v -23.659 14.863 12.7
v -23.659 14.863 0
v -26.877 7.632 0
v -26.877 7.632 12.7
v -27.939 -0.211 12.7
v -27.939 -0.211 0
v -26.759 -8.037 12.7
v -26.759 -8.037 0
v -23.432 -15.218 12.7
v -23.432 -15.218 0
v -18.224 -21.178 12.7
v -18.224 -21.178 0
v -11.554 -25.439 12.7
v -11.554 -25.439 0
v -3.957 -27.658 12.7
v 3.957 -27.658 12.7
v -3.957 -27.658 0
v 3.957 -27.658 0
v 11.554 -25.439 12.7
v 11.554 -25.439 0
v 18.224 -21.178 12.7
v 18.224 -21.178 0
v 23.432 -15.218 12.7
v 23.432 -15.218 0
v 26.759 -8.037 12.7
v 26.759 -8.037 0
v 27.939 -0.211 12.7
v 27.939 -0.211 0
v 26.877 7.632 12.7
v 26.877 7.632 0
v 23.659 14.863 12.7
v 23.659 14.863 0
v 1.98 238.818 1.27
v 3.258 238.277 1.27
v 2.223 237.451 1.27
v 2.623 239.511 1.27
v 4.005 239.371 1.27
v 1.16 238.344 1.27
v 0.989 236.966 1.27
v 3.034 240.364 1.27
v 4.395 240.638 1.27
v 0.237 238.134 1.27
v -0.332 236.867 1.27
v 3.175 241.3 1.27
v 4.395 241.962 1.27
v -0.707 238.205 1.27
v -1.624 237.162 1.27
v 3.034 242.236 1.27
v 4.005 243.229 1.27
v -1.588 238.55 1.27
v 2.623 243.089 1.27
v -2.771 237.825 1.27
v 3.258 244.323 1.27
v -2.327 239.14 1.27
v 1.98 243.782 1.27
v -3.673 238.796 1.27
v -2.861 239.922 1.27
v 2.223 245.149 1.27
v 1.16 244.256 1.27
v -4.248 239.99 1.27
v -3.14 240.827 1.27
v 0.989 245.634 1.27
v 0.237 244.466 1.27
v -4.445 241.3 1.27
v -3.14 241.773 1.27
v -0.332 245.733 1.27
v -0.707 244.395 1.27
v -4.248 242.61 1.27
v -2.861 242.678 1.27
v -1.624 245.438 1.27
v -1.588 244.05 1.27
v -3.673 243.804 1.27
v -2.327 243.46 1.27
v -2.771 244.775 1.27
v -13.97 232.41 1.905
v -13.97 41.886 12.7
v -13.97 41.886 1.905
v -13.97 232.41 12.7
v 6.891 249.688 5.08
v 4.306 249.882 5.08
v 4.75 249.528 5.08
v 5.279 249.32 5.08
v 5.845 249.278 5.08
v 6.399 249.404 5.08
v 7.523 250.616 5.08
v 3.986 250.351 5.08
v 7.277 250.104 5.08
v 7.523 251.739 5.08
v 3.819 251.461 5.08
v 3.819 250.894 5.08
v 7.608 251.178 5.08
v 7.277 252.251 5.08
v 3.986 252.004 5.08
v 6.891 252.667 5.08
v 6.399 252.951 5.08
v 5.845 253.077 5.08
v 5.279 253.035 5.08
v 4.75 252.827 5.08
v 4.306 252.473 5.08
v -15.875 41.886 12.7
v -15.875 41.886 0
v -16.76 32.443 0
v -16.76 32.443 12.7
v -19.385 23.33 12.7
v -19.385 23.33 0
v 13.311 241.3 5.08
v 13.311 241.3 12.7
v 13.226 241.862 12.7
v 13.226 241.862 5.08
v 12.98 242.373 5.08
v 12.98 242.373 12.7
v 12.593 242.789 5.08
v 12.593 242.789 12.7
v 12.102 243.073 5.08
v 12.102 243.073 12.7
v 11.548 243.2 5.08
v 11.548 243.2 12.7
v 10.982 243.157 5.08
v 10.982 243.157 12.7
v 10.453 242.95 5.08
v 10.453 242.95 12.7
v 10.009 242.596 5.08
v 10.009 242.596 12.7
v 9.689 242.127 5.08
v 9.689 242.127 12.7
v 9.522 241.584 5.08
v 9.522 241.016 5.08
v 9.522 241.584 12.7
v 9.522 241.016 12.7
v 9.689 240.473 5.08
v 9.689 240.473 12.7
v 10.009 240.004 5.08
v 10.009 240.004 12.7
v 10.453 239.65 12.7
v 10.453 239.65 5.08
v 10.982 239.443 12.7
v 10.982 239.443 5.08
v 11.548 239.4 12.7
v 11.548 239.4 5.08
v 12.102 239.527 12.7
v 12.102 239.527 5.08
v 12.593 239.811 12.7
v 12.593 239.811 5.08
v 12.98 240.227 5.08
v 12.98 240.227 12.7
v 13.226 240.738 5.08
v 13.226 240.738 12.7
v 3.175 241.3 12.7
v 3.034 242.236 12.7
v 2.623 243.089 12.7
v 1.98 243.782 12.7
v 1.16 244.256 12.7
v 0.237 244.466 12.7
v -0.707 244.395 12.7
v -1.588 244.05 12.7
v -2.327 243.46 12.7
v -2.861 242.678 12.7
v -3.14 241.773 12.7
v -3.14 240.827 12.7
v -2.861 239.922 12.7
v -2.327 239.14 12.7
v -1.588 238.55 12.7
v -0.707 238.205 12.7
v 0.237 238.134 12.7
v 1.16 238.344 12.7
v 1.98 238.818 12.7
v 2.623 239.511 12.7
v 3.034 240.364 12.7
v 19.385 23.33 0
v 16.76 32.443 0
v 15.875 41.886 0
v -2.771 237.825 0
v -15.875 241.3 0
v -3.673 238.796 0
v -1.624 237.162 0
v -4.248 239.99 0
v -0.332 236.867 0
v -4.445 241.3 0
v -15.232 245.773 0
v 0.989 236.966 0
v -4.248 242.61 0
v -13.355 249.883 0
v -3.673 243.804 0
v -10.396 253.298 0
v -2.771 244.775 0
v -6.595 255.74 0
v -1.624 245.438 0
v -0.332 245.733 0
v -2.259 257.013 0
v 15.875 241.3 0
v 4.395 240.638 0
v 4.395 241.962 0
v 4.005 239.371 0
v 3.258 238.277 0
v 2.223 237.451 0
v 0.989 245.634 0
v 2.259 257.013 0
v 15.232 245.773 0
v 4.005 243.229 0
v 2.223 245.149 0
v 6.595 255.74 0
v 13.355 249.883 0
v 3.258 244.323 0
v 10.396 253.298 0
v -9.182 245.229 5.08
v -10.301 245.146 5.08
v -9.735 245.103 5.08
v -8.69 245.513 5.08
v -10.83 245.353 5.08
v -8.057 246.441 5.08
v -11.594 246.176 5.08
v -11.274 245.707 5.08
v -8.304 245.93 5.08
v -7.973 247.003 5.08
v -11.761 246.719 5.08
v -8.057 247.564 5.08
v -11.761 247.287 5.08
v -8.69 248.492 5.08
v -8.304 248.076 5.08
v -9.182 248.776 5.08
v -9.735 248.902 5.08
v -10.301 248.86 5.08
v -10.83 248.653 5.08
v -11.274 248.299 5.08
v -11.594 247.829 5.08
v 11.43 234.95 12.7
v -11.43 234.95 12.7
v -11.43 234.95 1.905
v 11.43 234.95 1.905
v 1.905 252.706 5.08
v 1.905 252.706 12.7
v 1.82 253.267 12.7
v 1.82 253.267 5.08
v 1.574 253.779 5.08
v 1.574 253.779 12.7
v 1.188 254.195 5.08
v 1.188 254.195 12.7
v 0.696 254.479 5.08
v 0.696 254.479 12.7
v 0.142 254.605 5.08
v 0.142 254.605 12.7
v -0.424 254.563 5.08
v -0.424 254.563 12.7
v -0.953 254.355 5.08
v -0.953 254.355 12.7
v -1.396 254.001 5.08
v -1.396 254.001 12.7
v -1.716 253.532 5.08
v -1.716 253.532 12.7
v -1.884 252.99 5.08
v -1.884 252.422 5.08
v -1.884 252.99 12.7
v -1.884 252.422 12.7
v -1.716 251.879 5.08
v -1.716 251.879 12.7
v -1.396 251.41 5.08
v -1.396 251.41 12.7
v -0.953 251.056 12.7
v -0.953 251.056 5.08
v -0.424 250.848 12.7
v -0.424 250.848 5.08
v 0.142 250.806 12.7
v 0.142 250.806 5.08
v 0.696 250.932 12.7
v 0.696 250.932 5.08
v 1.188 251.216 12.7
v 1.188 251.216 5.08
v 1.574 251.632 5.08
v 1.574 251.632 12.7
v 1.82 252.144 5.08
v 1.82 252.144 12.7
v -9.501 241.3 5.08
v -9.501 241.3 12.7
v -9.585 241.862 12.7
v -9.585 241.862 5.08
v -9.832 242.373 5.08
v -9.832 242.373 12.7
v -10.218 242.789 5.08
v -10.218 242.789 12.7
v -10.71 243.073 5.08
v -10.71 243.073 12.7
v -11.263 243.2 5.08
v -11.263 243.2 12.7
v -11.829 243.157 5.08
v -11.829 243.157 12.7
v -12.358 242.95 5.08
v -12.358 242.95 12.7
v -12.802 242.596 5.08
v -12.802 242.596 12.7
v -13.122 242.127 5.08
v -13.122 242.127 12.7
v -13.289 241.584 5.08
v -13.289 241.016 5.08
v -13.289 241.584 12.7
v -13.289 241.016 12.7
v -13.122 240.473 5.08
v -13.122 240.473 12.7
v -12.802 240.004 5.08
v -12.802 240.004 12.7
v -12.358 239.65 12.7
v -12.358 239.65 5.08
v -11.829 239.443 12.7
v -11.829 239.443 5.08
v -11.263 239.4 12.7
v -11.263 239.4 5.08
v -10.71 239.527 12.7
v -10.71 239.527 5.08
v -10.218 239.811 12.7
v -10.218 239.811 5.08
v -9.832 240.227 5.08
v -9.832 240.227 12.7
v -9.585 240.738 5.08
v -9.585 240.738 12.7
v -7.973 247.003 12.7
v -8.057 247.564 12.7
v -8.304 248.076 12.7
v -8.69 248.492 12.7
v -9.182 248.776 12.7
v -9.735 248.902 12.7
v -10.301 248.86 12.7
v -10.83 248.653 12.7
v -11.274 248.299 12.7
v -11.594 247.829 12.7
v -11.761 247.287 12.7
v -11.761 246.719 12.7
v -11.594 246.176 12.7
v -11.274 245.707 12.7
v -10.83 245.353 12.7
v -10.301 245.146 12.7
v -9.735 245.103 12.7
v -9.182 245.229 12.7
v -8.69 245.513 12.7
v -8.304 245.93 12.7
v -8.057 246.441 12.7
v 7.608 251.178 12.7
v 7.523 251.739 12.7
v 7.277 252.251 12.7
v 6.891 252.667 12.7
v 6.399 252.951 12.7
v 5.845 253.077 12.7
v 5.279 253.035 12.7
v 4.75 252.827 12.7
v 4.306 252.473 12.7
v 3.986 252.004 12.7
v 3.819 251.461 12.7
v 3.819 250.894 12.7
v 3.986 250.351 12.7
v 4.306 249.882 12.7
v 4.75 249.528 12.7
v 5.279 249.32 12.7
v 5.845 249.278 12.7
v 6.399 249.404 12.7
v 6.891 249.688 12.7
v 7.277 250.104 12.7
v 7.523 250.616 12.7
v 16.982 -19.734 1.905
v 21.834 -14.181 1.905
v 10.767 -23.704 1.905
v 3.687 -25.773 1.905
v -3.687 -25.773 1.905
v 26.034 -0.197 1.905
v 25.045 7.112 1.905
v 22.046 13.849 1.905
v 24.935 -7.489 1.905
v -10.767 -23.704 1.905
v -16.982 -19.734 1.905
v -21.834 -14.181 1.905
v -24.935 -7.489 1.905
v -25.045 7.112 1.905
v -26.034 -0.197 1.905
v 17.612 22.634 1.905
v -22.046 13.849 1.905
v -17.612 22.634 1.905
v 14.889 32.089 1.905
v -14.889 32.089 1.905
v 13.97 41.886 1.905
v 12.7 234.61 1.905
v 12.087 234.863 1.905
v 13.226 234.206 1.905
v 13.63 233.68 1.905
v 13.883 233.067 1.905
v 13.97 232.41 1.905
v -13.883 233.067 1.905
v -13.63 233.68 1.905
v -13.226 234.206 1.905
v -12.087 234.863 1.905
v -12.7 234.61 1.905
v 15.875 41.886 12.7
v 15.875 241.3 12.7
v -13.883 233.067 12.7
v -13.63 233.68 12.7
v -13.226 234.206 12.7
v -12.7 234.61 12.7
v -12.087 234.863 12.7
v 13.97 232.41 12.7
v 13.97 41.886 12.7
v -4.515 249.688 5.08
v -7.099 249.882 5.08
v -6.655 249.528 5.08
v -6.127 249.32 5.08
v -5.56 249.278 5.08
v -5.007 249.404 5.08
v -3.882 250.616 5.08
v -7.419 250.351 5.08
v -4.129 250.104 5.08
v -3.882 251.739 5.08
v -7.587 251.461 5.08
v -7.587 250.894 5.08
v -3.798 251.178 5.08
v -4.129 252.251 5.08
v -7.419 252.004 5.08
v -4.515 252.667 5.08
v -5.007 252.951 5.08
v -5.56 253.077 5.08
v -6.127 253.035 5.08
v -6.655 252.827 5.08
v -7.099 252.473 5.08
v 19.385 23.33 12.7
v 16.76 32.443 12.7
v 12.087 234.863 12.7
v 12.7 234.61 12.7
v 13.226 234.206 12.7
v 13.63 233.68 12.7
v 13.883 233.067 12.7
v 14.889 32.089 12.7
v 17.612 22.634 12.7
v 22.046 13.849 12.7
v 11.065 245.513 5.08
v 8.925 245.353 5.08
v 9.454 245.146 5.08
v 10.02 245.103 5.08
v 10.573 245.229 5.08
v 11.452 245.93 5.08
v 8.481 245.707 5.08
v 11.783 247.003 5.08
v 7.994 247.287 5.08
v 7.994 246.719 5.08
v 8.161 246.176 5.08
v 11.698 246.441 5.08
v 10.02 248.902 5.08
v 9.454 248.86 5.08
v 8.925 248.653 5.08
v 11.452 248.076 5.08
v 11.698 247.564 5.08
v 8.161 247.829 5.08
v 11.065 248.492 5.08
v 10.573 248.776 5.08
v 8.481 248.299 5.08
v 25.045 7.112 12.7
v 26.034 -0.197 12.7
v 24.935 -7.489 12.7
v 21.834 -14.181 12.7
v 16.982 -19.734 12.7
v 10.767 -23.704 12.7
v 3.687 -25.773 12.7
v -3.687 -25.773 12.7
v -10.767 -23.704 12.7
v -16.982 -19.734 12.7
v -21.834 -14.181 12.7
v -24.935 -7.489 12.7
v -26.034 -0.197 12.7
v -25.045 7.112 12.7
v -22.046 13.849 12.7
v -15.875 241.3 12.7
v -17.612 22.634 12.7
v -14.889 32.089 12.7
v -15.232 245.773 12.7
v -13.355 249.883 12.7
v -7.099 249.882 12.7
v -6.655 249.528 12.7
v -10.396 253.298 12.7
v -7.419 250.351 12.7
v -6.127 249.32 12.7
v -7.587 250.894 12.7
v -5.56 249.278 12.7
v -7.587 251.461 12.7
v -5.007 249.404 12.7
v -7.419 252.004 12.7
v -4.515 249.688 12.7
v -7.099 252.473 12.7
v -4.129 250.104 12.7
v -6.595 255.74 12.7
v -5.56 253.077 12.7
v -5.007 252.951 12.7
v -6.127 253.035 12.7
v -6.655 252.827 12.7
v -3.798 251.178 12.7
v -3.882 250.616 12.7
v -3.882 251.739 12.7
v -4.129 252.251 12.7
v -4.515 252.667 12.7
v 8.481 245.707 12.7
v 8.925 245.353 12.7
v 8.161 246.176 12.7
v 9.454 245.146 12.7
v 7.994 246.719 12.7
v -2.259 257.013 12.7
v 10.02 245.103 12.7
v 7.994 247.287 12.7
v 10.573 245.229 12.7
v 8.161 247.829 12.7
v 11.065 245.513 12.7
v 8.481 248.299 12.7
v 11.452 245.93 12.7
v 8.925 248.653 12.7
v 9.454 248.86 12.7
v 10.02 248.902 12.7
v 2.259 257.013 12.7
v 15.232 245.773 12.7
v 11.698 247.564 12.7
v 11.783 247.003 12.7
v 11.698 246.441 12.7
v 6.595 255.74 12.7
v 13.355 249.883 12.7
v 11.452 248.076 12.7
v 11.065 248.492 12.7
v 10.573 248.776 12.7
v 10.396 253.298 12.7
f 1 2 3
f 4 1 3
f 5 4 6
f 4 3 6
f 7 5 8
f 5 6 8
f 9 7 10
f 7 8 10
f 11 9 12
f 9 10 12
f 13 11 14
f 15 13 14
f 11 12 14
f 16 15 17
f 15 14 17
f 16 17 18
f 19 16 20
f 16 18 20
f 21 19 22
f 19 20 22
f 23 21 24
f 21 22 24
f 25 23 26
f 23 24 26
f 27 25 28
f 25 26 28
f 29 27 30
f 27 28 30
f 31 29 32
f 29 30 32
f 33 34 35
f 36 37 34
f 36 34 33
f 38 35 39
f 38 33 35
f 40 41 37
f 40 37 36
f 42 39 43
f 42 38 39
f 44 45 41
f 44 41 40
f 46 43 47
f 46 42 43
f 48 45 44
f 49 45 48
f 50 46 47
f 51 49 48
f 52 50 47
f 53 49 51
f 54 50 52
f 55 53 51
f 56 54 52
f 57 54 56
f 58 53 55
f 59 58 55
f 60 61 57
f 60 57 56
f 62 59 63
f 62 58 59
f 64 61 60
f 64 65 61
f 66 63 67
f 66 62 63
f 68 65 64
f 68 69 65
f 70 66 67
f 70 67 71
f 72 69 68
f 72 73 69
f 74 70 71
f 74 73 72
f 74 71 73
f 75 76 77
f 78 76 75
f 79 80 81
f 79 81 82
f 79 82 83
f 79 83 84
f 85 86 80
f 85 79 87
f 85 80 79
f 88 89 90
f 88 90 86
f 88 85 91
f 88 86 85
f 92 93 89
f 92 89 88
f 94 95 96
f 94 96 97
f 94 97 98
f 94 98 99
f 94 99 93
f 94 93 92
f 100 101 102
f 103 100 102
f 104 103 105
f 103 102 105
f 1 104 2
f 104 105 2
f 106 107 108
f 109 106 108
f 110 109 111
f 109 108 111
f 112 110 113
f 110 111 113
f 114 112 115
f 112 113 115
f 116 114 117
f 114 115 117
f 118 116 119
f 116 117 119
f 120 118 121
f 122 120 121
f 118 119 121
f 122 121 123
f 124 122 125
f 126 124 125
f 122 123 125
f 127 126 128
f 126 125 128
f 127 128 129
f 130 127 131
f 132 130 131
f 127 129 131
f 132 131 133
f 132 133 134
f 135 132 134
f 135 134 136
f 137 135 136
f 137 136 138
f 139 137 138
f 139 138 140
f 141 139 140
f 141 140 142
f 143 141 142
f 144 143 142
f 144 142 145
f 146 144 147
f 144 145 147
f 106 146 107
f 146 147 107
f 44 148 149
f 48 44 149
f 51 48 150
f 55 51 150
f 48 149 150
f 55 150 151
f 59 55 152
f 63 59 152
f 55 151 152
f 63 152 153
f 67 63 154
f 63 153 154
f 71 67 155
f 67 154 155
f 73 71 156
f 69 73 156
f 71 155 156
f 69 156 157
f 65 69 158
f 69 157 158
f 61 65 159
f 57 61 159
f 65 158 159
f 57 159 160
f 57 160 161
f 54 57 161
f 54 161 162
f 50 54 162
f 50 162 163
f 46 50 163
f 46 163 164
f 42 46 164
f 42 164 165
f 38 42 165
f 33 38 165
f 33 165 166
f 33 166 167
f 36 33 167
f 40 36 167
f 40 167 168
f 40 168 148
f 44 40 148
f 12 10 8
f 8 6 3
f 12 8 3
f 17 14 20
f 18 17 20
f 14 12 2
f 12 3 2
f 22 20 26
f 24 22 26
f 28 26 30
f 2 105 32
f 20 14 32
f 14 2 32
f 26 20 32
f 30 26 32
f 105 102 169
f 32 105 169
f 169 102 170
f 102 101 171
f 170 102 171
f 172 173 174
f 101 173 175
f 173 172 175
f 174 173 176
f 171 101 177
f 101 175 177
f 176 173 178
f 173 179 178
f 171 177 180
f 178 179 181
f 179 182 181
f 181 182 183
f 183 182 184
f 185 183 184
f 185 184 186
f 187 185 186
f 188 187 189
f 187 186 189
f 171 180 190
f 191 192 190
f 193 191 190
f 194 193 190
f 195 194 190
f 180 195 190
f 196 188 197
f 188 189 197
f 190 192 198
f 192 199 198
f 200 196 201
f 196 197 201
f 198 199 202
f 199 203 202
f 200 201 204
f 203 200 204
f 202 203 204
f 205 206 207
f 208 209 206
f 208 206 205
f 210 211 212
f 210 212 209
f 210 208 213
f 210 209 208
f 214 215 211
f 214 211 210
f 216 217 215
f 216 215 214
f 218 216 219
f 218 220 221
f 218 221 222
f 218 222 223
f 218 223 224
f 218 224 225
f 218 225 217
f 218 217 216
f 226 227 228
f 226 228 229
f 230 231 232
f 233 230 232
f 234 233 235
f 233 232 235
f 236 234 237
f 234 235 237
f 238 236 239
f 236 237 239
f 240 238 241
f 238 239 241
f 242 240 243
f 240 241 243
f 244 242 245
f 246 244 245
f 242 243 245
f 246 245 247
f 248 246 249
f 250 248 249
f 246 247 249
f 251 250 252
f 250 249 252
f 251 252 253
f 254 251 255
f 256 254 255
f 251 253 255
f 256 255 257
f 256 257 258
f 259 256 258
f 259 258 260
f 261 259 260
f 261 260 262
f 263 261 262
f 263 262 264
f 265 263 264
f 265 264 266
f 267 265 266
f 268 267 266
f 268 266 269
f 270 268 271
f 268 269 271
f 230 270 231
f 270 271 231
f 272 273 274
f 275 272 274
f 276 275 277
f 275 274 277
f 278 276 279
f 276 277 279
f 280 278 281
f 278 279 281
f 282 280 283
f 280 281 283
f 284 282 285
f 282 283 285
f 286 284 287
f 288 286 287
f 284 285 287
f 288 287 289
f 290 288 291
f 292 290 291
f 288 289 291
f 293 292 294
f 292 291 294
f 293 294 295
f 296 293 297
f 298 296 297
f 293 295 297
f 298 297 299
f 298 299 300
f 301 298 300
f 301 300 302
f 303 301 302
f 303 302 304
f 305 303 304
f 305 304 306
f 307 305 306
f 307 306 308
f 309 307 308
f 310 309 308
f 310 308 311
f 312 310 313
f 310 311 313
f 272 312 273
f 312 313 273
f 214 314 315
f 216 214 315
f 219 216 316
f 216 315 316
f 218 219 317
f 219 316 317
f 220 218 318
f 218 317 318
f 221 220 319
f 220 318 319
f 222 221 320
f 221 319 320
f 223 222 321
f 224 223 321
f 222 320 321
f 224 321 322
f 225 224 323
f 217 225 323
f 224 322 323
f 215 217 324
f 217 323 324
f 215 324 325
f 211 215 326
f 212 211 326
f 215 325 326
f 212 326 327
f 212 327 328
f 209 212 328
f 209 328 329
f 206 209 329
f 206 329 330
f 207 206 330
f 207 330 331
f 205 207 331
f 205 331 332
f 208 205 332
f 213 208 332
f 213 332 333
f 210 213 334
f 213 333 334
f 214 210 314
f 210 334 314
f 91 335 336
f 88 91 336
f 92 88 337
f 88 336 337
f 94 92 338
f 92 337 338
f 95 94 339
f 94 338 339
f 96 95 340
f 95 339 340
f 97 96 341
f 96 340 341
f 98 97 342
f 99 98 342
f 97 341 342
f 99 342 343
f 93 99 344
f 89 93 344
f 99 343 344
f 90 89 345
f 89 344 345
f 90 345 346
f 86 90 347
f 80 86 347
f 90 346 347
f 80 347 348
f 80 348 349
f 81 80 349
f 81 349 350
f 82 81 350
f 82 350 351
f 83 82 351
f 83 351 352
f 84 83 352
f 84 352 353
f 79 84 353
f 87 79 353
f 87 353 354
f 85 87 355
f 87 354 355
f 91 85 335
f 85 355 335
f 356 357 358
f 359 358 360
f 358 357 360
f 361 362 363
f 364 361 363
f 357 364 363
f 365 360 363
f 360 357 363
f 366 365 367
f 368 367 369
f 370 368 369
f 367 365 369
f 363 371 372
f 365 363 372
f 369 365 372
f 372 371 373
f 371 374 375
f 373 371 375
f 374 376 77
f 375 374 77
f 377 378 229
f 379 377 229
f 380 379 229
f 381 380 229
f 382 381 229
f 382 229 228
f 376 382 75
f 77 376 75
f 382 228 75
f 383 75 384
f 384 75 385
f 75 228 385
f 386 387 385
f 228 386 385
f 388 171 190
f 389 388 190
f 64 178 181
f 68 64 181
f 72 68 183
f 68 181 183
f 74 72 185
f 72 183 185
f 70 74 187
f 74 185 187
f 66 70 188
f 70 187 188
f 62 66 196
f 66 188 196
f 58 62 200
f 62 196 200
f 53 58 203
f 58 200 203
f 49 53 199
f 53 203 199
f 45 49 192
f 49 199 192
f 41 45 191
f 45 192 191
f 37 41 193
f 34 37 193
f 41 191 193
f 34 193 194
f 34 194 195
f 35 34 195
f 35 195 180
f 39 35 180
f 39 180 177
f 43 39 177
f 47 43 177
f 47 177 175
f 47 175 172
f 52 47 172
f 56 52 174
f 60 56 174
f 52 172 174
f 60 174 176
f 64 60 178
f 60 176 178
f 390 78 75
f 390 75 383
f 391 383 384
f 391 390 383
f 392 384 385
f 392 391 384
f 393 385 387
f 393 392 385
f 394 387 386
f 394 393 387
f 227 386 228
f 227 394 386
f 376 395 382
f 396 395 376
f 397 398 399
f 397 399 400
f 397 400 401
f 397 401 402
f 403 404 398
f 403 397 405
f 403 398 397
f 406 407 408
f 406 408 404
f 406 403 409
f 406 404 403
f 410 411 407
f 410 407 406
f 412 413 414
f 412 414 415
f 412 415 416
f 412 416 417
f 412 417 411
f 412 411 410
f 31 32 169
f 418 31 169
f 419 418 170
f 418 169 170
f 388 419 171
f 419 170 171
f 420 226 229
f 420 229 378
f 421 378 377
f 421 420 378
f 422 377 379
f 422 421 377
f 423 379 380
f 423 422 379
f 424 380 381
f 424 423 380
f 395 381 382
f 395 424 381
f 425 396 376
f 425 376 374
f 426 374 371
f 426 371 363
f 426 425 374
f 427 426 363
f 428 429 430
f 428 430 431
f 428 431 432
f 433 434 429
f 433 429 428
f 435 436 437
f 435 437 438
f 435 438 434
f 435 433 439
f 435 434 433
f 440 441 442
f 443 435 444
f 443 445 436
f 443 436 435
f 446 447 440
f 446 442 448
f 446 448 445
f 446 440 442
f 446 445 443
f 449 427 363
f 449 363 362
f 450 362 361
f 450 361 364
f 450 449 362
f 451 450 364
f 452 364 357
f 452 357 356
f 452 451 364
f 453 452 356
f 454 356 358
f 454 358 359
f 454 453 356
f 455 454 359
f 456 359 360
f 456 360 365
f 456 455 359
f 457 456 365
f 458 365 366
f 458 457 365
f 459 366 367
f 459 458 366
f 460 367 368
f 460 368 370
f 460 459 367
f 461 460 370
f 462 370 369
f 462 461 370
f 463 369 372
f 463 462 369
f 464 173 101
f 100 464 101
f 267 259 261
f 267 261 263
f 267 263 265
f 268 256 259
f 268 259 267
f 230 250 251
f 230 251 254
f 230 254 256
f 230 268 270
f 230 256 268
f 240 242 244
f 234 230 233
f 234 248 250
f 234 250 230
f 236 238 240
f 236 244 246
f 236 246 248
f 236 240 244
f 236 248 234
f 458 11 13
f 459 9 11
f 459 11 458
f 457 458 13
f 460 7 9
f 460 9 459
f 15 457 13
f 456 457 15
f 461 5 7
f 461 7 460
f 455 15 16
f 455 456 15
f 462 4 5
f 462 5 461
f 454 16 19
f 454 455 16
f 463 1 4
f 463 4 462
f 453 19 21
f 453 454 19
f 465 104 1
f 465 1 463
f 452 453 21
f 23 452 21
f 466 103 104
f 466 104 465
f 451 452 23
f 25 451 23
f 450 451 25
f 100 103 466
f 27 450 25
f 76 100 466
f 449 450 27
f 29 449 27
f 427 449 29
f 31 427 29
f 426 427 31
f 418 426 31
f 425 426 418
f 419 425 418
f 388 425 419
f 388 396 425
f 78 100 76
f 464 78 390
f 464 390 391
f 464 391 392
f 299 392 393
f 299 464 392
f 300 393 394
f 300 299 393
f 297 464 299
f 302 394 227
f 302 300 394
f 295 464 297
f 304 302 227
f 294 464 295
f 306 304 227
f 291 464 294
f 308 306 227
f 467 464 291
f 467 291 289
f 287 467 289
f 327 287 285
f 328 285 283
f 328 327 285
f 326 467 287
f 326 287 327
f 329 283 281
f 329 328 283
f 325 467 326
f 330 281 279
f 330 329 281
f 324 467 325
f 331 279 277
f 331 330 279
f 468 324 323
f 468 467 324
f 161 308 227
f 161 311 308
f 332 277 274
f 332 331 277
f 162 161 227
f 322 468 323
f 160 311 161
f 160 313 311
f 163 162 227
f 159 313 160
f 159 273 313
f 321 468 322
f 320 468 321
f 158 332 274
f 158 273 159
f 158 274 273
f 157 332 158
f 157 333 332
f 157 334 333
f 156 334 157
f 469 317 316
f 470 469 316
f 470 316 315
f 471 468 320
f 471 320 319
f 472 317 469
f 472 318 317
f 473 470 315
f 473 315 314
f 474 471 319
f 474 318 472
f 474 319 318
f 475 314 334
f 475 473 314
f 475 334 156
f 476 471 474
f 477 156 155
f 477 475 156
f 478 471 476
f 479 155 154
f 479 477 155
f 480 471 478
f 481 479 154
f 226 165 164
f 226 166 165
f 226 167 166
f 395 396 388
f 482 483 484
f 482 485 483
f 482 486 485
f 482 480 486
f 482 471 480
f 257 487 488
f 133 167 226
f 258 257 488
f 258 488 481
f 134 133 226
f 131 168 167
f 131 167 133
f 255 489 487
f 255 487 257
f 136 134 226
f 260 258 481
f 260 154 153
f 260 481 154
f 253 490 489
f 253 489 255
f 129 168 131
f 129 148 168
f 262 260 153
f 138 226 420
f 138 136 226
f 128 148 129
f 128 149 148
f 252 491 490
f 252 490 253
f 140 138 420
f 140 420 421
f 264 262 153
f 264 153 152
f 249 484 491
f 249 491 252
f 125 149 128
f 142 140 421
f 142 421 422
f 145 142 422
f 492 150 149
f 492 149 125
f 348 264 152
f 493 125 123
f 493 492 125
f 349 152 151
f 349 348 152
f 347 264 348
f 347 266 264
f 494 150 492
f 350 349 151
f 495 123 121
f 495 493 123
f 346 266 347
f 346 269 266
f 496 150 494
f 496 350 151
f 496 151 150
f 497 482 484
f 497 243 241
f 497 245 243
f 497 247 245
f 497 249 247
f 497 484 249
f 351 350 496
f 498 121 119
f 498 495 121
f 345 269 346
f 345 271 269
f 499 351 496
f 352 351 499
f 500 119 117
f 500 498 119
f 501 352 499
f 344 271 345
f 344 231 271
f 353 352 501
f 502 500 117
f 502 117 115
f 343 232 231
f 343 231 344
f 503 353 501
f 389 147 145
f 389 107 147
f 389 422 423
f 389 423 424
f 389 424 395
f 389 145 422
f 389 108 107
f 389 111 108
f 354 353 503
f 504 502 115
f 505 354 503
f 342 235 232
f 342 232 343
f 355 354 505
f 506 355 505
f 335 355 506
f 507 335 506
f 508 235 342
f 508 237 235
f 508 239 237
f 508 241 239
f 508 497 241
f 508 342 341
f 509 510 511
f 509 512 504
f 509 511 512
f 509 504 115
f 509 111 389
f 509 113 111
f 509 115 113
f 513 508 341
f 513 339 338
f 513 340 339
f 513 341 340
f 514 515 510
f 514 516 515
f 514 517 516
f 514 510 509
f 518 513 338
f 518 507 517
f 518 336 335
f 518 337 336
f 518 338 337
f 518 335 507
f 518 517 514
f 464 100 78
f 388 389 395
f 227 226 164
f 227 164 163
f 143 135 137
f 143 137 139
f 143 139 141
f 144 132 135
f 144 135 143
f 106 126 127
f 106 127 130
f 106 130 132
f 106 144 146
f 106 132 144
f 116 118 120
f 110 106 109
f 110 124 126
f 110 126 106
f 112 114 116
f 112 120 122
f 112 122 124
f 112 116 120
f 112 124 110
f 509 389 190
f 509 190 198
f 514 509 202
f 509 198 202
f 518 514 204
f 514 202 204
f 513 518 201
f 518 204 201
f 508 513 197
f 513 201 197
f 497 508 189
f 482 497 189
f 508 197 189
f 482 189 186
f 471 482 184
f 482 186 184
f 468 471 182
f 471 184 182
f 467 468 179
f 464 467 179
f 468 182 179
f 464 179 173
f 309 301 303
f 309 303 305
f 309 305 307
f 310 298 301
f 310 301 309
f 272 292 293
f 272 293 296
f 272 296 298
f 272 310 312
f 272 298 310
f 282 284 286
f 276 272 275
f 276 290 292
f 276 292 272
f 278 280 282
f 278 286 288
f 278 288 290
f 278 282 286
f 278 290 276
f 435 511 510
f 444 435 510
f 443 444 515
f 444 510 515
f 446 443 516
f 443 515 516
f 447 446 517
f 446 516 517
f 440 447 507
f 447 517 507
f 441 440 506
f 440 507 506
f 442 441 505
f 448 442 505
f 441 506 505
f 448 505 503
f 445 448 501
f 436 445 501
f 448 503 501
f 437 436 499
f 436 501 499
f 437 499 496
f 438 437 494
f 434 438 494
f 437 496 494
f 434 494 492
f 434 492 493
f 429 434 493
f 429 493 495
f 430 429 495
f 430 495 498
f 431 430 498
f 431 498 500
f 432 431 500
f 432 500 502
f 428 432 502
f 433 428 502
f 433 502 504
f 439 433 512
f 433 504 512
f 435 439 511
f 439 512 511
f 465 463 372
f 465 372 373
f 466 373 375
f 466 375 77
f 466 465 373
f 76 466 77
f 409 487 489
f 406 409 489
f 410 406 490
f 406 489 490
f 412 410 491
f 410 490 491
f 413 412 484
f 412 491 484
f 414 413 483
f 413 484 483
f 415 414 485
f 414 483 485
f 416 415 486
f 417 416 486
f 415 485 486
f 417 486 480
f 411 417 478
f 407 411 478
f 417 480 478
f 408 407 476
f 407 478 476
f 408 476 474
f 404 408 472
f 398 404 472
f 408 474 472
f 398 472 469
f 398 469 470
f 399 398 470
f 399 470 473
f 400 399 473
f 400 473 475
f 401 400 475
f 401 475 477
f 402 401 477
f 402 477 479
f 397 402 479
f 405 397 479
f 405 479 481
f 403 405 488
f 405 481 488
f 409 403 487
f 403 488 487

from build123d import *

# Parameters (mm, degrees)
BOSS_EXTRUDE1_DEPTH = 12.7
CUT_EXTRUDE1_DEPTH  = 10.795
SKETCH3_R           = 3.175
CUT_EXTRUDE2_DEPTH  = 23.622
SKETCH4_R           = 1.905
CUT_EXTRUDE3_DEPTH  = 7.62
SKETCH5_R           = 4.445
CUT_EXTRUDE4_DEPTH  = 1.27


with BuildPart() as part:
    # Sketch1 → Boss-Extrude1 (new body)
    with BuildSketch(Plane.XY):
        with BuildLine():
            Line((-15.875, 241.3), (-15.875, 41.885940063))
            ThreePointArc((-15.875, 41.885940063), (-17.859739298, 27.82498979), (-23.658870968, 14.862752926))
            ThreePointArc((-23.658870968, 14.862752926), (0, -27.94), (23.658870968, 14.862752926))
            ThreePointArc((23.658870968, 14.862752926), (17.859739298, 27.82498979), (15.875, 41.885940063))
            Line((15.875, 41.885940063), (15.875, 241.3))
            ThreePointArc((15.875, 241.3), (0, 257.175), (-15.875, 241.3))
        make_face()
    extrude(amount=BOSS_EXTRUDE1_DEPTH)

    # Sketch2 → Cut-Extrude1 (cut)
    with BuildSketch(Plane.XY.offset(12.7)):
        with BuildLine():
            Line((-11.43, 234.95), (11.43, 234.95))
            ThreePointArc((11.43, 234.95), (13.226051224, 234.206051224), (13.97, 232.41))
            Line((13.97, 232.41), (13.97, 41.885940063))
            ThreePointArc((13.97, 41.885940063), (16.029167022, 27.297704155), (22.045766129, 13.849383408))
            ThreePointArc((22.045766129, 13.849383408), (0, -26.035), (-22.045766129, 13.849383408))
            ThreePointArc((-22.045766129, 13.849383408), (-16.029167022, 27.297704155), (-13.97, 41.885940063))
            Line((-13.97, 41.885940063), (-13.97, 232.41))
            ThreePointArc((-13.97, 232.41), (-13.226051224, 234.206051224), (-11.43, 234.95))
        make_face()
    extrude(amount=-CUT_EXTRUDE1_DEPTH, mode=Mode.SUBTRACT)

    # Sketch3 → Cut-Extrude2 (cut)
    with BuildSketch(Plane.XY.offset(12.7)):
        with Locations((0, 241.3)):
            Circle(SKETCH3_R)
    extrude(amount=-CUT_EXTRUDE2_DEPTH, mode=Mode.SUBTRACT)

    # Sketch4 → Cut-Extrude3 (cut)
    with BuildSketch(Plane.XY.offset(12.7)):
        with Locations((-11.405580841, 241.3)):
            Circle(SKETCH4_R)
        with Locations((-9.877522754, 247.002790421)):
            Circle(SKETCH4_R)
        with Locations((-5.702790421, 251.177522754)):
            Circle(SKETCH4_R)
        with Locations((0, 252.705580841)):
            Circle(SKETCH4_R)
        with Locations((5.702790421, 251.177522754)):
            Circle(SKETCH4_R)
        with Locations((9.877522754, 247.002790421)):
            Circle(SKETCH4_R)
        with Locations((11.405580841, 241.3)):
            Circle(SKETCH4_R)
    extrude(amount=-CUT_EXTRUDE3_DEPTH, mode=Mode.SUBTRACT)

    # Sketch5 → Cut-Extrude4 (cut)
    with BuildSketch(Plane(origin=(0, 0, 0), x_dir=(-1, 0, 0), z_dir=(0, 0, -1))):
        with Locations((0, 241.3)):
            Circle(SKETCH5_R)
    extrude(amount=-CUT_EXTRUDE4_DEPTH, mode=Mode.SUBTRACT)


solid = part.part
